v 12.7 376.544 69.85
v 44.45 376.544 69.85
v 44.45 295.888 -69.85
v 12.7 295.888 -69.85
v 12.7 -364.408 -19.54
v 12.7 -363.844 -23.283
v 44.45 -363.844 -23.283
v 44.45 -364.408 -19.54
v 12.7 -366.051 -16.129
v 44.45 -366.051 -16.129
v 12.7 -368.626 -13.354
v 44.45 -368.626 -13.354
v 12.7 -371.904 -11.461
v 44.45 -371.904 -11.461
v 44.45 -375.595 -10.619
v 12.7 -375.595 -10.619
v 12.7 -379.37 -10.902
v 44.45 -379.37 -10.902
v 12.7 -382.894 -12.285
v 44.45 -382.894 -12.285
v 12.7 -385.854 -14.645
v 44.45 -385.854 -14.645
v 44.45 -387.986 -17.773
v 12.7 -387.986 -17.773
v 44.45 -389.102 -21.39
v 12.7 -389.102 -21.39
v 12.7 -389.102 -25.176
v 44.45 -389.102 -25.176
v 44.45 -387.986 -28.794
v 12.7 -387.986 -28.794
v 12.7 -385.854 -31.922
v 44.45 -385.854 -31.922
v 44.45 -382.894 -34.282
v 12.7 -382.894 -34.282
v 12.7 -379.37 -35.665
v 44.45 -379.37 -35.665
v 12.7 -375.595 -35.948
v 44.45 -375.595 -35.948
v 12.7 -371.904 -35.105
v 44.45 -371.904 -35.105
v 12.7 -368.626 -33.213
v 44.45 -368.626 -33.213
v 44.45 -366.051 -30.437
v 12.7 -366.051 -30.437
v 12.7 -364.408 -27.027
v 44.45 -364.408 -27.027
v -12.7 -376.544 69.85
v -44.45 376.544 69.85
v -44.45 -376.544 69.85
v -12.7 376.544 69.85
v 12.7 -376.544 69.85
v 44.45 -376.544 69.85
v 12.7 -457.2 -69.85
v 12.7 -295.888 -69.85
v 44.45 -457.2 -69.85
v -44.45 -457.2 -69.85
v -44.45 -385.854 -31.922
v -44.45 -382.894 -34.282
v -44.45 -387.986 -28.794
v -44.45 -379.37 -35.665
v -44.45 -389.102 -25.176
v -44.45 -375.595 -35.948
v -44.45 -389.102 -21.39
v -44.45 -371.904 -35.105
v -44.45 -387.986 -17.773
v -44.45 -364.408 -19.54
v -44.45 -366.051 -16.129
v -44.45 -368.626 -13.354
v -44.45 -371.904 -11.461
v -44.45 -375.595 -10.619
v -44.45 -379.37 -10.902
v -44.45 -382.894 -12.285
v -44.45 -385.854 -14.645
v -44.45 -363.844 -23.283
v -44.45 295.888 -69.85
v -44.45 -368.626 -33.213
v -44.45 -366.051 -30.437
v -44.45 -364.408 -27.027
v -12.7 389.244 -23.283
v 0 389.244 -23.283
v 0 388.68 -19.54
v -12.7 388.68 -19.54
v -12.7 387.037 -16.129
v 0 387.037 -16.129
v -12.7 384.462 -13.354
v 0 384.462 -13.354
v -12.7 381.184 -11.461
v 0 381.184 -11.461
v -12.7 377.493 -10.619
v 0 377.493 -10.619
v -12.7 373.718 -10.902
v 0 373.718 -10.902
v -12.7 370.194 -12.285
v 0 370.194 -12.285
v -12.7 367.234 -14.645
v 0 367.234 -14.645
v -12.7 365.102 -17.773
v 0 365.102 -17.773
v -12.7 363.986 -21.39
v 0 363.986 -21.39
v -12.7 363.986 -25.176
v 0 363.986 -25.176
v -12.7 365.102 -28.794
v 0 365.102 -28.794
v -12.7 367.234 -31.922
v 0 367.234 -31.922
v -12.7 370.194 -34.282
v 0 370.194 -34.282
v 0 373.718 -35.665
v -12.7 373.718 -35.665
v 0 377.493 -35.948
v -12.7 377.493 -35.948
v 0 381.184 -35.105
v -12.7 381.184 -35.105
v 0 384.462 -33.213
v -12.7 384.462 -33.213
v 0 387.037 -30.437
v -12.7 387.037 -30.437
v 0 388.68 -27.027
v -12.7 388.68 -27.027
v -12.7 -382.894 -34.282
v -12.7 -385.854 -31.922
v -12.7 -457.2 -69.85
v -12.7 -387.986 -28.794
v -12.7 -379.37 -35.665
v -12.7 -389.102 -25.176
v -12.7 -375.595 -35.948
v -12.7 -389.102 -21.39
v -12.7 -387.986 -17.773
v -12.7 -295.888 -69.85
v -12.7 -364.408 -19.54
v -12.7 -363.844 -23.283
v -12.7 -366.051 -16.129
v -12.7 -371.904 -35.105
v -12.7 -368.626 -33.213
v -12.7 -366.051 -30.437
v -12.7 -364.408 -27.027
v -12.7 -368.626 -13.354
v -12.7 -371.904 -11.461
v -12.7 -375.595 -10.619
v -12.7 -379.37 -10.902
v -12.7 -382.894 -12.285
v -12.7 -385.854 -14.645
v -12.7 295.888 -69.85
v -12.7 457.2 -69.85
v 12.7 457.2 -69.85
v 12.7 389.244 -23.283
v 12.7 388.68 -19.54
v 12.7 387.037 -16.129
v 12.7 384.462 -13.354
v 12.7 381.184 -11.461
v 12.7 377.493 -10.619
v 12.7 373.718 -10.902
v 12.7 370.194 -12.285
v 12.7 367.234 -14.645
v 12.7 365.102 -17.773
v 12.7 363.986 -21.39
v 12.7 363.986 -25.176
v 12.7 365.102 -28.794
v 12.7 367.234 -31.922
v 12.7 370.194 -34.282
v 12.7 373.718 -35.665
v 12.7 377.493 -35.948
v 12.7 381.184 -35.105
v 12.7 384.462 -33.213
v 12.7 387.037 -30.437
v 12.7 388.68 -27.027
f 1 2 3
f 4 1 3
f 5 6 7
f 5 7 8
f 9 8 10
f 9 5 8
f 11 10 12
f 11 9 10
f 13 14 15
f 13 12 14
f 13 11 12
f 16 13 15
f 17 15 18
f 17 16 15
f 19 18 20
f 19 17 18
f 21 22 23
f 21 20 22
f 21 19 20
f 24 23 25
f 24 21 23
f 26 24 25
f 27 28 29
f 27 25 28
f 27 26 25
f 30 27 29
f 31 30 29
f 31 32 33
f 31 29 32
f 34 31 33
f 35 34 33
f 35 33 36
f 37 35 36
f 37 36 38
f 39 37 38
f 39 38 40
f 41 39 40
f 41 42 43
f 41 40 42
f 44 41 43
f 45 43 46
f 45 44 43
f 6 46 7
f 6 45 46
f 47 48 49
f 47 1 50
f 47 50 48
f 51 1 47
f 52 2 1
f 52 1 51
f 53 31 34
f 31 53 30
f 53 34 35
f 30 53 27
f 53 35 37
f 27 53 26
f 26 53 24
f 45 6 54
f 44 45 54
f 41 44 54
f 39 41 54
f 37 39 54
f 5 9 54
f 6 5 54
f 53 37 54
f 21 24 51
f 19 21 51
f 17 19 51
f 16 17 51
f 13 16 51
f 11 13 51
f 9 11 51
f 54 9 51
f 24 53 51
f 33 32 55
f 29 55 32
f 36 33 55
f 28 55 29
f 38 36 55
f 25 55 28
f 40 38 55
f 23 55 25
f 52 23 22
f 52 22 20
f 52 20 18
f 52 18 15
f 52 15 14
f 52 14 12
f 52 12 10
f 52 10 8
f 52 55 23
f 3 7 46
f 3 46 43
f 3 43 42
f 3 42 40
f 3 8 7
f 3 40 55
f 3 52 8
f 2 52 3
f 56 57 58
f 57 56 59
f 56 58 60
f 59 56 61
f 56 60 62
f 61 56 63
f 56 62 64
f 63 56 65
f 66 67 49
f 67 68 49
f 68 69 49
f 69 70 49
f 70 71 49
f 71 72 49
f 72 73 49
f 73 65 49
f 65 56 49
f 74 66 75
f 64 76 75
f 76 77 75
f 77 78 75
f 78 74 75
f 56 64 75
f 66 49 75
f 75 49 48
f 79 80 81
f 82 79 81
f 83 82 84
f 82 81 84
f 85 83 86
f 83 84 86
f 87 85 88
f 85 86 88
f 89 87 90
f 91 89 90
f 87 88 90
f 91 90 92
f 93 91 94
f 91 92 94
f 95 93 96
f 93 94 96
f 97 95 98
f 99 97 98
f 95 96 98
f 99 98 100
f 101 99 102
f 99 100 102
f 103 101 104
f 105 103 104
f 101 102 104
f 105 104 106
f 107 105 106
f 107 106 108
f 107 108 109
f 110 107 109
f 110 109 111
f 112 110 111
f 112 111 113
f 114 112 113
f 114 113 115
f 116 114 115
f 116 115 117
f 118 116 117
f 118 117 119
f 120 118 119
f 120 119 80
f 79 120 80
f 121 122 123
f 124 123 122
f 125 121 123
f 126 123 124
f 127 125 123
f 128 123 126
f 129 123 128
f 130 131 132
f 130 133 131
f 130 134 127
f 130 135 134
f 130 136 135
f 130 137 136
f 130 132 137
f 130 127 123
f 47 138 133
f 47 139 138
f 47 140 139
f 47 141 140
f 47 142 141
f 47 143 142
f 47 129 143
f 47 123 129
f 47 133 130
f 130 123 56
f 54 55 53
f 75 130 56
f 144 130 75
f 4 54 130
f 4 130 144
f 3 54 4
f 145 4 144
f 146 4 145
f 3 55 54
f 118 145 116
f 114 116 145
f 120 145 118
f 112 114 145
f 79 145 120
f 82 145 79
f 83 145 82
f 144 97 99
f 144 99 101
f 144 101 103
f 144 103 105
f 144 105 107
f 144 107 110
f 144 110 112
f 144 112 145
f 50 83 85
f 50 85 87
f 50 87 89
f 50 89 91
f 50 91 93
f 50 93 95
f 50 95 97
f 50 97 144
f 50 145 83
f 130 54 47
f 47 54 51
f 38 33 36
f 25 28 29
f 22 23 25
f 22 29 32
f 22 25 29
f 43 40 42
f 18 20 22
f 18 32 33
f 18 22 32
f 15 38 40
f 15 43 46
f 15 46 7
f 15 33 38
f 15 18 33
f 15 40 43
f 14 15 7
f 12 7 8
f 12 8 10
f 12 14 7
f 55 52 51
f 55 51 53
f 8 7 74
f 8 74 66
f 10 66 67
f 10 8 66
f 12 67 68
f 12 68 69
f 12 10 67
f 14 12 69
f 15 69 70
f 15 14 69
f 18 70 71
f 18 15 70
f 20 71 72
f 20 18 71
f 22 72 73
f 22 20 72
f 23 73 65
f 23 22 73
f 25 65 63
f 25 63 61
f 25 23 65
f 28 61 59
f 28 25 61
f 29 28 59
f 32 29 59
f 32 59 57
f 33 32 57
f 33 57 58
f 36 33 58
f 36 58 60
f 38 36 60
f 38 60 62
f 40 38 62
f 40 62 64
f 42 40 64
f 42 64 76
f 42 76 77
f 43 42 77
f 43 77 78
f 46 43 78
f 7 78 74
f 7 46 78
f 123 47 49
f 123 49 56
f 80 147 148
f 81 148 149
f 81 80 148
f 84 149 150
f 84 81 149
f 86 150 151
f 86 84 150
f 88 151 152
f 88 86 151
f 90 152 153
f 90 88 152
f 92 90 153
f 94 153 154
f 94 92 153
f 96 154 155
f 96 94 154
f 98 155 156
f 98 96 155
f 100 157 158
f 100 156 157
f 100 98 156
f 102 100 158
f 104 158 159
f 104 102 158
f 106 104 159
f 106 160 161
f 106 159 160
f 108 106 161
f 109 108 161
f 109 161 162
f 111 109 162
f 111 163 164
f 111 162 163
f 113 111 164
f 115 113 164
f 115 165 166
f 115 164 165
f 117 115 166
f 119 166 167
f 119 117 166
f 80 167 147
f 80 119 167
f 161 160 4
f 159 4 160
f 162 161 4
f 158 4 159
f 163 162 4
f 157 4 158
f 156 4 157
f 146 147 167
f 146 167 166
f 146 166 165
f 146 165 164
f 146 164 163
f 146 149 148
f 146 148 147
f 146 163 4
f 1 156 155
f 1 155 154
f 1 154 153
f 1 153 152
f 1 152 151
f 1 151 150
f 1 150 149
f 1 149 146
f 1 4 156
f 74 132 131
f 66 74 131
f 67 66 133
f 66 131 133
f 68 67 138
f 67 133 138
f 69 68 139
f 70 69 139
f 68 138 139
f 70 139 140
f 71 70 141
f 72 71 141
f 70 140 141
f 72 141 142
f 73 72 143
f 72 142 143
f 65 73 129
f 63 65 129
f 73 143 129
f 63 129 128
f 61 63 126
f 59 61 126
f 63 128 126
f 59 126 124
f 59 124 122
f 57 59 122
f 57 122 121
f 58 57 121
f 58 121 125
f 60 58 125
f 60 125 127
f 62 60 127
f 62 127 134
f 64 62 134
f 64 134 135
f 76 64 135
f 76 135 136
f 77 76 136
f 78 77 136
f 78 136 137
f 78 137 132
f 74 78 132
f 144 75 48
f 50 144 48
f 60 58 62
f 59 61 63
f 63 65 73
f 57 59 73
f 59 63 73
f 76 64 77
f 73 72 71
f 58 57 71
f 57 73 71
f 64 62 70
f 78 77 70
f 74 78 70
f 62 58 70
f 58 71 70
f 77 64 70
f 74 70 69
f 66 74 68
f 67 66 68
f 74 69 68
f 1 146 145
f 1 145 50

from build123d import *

# Parameters (mm, degrees)
F1_DEPTH      = 44.45
F1_DEPTH_BACK = 44.45
F3_DEPTH      = 12.7
F3_DEPTH_BACK = 12.7
F5_DEPTH      = 31.75
F7_DEPTH      = 31.75
F8_R          = 12.7
F9_DEPTH      = 44.451
F9_DEPTH_BACK = 44.451
F10_R         = 12.7
F11_DEPTH     = 88.9


with BuildPart() as f1:
    # F0 (on Right) → F1 (new body, two sides)
    with BuildSketch(Plane.YZ) as f1_sk:
        Polygon((376.5441673942, 69.85), (-376.5441673942, 69.85), (-457.2, -69.85), (457.2, -69.85), align=None)
    extrude(amount=F1_DEPTH)
    extrude(f1_sk.sketch, amount=-F1_DEPTH_BACK)

    # F2 (on Right) → F3 (cut, two sides)
    with BuildSketch(Plane.YZ) as f3_sk:
        Polygon((-295.8883347884, -69.85), (-376.5441673942, 69.85), (-457.2, -69.85), align=None)
    extrude(amount=-F3_DEPTH, mode=Mode.SUBTRACT)
    extrude(f3_sk.sketch, amount=F3_DEPTH_BACK, mode=Mode.SUBTRACT)

    # F4 (on face) → F5 (cut)
    with BuildSketch(Plane.YZ.offset(44.45)):
        Polygon((457.2, -69.85), (376.5441673942, 69.85), (295.8883347884, -69.85), align=None)
    extrude(amount=-F5_DEPTH, mode=Mode.SUBTRACT)

    # F6 (on face) → F7 (cut)
    with BuildSketch(Plane(origin=(-44.45, 0, 0), x_dir=(0, -1, 0), z_dir=(-1, 0, 0))):
        Polygon((-295.8883347884, -69.85), (-376.5441673942, 69.85), (-457.2, -69.85), align=None)
    extrude(amount=-F7_DEPTH, mode=Mode.SUBTRACT)

    # F8 (on Right) → F9 (cut, two sides)
    with BuildSketch(Plane.YZ) as f9_sk:
        with Locations((-376.5441673942, -23.2833333333)):
            Circle(F8_R)
        with Locations((376.5441673942, -23.2833333333)):
            Circle(F8_R)
    extrude(amount=-F9_DEPTH, mode=Mode.SUBTRACT)
    extrude(f9_sk.sketch, amount=F9_DEPTH_BACK, mode=Mode.SUBTRACT)


with BuildPart() as f11:
    # F10 (on face) → F11 (new body)
    with BuildSketch(Plane.YZ.offset(44.45)):
        with Locations((-376.5441673942, -23.2833333333)):
            Circle(F10_R)
    extrude(amount=-F11_DEPTH)


solid = Compound([f1.part, f11.part])
